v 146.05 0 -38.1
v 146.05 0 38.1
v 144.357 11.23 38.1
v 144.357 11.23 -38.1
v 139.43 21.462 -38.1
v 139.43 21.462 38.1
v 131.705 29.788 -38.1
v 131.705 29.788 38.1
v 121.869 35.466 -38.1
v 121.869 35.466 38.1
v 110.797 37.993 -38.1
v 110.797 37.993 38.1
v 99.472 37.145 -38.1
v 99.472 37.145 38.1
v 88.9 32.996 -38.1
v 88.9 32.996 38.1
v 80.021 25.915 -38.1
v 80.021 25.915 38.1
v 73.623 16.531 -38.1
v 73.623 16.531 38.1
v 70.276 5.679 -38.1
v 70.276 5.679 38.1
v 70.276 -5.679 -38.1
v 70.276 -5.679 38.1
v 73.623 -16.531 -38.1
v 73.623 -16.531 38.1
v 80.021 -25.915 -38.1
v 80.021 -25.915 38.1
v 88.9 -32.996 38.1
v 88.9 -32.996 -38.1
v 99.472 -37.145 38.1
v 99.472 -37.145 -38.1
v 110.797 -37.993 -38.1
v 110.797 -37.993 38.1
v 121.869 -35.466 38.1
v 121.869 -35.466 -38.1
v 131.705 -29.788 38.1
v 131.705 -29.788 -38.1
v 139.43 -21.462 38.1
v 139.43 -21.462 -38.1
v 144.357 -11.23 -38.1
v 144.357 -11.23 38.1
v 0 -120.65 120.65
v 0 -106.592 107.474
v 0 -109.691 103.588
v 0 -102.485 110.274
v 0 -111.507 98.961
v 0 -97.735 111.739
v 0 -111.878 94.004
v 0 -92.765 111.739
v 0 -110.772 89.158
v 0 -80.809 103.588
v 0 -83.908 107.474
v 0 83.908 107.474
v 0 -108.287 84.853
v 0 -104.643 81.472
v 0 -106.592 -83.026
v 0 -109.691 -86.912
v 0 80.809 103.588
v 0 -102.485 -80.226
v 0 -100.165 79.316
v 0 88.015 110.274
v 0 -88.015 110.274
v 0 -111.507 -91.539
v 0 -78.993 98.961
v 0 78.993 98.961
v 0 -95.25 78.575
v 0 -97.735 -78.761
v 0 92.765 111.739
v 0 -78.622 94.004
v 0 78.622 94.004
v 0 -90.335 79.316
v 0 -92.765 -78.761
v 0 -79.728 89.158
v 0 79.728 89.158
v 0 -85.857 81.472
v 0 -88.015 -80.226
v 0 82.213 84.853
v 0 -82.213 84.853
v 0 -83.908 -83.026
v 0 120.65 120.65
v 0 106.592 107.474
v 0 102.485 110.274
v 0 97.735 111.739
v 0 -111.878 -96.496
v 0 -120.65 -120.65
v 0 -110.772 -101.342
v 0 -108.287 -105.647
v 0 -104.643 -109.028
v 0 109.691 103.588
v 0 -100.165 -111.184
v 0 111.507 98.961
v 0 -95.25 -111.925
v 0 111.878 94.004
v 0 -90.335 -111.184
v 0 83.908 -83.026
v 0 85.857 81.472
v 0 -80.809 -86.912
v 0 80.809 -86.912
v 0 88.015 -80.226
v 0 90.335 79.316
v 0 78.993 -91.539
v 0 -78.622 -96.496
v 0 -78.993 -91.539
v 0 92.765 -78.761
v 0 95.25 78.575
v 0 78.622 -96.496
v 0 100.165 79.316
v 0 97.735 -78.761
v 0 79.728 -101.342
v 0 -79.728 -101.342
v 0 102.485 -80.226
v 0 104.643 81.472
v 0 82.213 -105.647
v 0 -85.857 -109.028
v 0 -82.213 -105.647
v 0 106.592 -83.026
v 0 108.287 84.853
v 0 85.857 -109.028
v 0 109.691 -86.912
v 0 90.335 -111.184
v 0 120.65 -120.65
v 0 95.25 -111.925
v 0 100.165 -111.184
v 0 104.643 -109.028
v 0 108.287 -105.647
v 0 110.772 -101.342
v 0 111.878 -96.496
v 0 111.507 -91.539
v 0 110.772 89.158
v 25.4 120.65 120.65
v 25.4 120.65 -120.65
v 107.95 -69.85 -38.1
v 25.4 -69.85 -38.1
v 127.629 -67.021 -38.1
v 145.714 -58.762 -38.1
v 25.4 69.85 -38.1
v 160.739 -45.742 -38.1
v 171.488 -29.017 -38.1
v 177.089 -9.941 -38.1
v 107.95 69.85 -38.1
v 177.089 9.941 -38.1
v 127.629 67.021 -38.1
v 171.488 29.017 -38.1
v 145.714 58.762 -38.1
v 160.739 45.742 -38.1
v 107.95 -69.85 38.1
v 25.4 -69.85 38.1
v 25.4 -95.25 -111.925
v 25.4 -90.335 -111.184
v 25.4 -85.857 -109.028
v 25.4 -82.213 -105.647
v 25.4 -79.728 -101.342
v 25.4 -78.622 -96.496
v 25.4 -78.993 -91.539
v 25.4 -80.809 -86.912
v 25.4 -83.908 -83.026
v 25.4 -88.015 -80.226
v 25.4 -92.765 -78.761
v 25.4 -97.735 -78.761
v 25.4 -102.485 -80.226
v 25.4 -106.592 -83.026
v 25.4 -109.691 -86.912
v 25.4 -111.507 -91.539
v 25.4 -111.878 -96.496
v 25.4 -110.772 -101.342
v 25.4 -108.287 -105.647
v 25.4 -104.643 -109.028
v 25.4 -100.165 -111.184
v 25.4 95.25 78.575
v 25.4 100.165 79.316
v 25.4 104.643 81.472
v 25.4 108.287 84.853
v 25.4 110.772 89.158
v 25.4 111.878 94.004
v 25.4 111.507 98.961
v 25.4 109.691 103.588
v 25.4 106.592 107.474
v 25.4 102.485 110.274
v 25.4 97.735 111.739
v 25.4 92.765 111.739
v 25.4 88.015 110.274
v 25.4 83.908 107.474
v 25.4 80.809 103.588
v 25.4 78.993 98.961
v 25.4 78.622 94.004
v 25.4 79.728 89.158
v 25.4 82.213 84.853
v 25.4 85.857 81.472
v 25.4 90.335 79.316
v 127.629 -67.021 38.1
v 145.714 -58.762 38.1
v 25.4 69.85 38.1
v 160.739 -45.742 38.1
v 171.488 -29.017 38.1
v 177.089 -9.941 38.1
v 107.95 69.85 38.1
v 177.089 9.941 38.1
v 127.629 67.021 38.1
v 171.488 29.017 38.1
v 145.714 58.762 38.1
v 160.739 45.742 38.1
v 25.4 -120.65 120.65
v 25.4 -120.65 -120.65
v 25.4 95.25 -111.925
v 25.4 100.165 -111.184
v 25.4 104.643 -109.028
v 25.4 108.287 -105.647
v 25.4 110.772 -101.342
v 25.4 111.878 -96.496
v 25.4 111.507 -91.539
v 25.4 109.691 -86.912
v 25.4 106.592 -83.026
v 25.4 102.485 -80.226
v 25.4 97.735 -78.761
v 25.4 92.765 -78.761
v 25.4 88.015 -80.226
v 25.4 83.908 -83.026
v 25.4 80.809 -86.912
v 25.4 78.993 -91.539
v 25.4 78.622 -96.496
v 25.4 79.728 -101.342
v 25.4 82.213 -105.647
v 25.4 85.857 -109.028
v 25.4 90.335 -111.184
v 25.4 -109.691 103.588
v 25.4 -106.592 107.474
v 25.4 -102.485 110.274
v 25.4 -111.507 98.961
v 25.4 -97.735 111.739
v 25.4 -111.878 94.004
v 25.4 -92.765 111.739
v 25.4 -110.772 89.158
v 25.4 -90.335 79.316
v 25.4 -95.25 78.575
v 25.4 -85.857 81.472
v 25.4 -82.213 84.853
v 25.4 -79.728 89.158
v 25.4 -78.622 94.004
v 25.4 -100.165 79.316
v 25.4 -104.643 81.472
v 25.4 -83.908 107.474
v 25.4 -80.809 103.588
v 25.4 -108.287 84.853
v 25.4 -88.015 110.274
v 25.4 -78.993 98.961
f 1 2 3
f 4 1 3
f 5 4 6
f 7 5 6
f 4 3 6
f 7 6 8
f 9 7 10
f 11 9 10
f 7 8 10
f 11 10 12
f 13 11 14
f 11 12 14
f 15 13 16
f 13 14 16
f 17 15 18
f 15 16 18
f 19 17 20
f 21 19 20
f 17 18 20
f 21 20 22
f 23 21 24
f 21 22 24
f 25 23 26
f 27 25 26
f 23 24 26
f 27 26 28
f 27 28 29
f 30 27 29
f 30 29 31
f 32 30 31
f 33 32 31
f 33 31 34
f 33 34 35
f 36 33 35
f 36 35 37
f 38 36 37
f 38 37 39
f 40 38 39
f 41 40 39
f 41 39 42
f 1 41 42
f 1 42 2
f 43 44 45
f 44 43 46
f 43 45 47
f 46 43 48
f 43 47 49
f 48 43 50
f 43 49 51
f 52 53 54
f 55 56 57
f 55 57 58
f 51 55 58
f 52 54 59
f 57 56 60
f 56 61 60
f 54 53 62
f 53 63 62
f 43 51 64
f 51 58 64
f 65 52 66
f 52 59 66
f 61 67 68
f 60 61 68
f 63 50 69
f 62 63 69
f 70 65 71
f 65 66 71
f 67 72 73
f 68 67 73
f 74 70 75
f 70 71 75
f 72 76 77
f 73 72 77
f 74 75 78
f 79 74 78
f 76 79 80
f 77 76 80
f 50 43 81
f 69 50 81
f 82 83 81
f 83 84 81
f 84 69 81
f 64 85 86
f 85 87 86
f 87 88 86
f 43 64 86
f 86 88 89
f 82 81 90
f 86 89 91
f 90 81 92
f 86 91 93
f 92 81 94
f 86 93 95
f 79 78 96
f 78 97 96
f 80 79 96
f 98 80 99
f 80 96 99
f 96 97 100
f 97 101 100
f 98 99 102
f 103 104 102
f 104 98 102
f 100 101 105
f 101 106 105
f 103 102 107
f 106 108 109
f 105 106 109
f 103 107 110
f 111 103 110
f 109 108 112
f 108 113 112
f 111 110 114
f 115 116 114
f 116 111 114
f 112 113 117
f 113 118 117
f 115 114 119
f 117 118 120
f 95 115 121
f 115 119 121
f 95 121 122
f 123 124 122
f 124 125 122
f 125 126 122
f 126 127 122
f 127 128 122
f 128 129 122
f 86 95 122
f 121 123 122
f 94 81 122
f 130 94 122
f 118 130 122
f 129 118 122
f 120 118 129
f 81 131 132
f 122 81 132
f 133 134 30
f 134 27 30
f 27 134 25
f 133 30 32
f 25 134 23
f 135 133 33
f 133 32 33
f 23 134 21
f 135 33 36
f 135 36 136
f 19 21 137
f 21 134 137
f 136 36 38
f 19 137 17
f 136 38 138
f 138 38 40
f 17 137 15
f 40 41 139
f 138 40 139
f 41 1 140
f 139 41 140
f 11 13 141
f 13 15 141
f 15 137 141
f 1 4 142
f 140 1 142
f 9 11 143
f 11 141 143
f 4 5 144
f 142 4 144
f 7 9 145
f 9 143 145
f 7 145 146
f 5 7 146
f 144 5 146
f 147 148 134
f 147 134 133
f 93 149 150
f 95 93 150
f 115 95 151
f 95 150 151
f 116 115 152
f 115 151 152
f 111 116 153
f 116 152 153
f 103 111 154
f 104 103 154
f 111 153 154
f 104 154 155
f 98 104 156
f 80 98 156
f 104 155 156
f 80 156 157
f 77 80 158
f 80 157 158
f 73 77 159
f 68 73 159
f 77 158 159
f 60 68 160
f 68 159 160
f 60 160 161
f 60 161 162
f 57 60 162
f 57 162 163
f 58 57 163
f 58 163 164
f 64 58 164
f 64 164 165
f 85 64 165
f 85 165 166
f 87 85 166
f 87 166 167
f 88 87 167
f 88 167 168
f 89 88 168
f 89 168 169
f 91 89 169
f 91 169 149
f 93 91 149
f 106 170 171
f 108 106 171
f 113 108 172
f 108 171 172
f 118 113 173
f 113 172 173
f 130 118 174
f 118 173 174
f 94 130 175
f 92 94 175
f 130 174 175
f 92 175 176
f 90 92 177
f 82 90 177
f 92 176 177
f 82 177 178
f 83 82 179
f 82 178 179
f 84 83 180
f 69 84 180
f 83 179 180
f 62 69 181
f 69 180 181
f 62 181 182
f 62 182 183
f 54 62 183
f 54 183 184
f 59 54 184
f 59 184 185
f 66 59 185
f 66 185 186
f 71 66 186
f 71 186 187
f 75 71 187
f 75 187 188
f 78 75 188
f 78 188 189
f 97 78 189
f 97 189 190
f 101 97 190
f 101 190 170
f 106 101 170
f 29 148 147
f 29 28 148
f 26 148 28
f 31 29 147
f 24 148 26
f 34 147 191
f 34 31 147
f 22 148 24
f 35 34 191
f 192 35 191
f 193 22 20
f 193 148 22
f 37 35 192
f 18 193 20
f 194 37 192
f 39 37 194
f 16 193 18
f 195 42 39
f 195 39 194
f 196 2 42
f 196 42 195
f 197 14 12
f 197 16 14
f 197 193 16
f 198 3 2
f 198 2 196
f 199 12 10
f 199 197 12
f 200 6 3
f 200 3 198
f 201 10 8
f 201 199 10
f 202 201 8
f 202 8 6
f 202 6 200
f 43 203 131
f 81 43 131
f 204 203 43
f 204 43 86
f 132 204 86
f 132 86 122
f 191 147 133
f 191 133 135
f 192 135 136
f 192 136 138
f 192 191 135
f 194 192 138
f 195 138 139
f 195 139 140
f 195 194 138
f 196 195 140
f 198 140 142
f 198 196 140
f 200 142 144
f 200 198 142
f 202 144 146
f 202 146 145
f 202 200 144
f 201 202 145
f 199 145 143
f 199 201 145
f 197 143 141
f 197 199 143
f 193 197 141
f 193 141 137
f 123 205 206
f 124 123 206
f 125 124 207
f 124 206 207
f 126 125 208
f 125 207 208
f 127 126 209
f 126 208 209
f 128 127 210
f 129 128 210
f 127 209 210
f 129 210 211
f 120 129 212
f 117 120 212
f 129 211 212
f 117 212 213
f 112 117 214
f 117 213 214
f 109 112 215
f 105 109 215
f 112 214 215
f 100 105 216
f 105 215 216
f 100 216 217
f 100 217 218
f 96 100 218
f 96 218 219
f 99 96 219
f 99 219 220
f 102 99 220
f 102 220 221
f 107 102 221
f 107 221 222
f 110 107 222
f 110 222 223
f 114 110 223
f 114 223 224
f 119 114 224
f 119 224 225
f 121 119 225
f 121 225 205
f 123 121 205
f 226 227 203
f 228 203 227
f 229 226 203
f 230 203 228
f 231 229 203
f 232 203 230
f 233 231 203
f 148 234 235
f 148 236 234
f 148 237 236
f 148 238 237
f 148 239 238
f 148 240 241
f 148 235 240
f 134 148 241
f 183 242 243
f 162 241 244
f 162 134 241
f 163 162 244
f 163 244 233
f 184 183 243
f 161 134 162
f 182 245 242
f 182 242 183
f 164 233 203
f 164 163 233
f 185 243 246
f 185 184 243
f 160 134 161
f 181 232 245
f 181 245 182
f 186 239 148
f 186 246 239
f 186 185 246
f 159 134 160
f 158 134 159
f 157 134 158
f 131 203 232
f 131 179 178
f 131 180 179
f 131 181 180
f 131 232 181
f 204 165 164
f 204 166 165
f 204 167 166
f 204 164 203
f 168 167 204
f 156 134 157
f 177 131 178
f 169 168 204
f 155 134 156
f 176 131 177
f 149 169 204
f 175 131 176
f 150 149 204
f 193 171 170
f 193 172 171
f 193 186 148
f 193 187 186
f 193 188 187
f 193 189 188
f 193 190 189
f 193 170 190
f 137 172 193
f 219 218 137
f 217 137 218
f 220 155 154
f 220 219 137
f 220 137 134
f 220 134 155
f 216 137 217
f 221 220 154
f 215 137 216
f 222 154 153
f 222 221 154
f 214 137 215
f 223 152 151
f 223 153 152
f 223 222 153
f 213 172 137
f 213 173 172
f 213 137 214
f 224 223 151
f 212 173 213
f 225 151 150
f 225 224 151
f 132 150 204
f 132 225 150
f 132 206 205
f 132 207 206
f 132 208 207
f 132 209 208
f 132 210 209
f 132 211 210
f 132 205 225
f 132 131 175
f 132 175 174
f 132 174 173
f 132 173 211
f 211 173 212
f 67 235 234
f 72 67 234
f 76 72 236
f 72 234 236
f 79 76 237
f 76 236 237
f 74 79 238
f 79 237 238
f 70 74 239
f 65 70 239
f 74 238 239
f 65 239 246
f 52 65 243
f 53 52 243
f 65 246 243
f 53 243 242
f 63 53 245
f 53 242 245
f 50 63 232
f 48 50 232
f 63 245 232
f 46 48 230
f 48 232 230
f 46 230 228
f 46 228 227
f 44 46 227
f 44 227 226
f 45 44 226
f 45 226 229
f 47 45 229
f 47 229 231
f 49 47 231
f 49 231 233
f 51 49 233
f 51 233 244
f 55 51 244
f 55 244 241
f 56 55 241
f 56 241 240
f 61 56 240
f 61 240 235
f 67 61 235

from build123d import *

# Parameters (mm, degrees)
SKETCH1_W           = 241.3
SKETCH1_H           = 241.3
BOSS_EXTRUDE1_DEPTH = 25.4
BOSS_EXTRUDE2_DEPTH = 76.2
HOLE1_D             = 76.2
HOLE1_DEPTH         = 158.75
HOLE2_D             = 33.3502
HOLE2_DEPTH         = 177.8


with BuildPart() as part:
    # Sketch1 → Boss-Extrude1 (new body)
    with BuildSketch(Plane(origin=(25.4, 0, 0), x_dir=(0, 0, -1), z_dir=(1, 0, 0))):
        Rectangle(SKETCH1_W, SKETCH1_H)
    extrude(amount=-BOSS_EXTRUDE1_DEPTH)

    # Sketch2 → Boss-Extrude2 (add)
    with BuildSketch(Plane.XY.offset(38.1)):
        with BuildLine():
            Line((25.4, 69.85), (25.4, -69.85))
            Line((25.4, -69.85), (107.95, -69.85))
            ThreePointArc((107.95, -69.85), (177.8, 0), (107.95, 69.85))
            Line((107.95, 69.85), (25.4, 69.85))
        make_face()
    extrude(amount=-BOSS_EXTRUDE2_DEPTH)

    # Hole1
    with Locations(Plane(origin=(0, 0, -38.1), x_dir=(-1, 0, 0), z_dir=(0, 0, -1))):
        with Locations((-107.95, 0)):
            Hole(HOLE1_D / 2, depth=HOLE1_DEPTH)

    # Hole2
    with Locations(Plane.ZY):
        with Locations((-95.25, -95.25), (-95.25, 95.25), (95.25, -95.25), (95.25, 95.25)):
            Hole(HOLE2_D / 2, depth=HOLE2_DEPTH)


solid = part.part
